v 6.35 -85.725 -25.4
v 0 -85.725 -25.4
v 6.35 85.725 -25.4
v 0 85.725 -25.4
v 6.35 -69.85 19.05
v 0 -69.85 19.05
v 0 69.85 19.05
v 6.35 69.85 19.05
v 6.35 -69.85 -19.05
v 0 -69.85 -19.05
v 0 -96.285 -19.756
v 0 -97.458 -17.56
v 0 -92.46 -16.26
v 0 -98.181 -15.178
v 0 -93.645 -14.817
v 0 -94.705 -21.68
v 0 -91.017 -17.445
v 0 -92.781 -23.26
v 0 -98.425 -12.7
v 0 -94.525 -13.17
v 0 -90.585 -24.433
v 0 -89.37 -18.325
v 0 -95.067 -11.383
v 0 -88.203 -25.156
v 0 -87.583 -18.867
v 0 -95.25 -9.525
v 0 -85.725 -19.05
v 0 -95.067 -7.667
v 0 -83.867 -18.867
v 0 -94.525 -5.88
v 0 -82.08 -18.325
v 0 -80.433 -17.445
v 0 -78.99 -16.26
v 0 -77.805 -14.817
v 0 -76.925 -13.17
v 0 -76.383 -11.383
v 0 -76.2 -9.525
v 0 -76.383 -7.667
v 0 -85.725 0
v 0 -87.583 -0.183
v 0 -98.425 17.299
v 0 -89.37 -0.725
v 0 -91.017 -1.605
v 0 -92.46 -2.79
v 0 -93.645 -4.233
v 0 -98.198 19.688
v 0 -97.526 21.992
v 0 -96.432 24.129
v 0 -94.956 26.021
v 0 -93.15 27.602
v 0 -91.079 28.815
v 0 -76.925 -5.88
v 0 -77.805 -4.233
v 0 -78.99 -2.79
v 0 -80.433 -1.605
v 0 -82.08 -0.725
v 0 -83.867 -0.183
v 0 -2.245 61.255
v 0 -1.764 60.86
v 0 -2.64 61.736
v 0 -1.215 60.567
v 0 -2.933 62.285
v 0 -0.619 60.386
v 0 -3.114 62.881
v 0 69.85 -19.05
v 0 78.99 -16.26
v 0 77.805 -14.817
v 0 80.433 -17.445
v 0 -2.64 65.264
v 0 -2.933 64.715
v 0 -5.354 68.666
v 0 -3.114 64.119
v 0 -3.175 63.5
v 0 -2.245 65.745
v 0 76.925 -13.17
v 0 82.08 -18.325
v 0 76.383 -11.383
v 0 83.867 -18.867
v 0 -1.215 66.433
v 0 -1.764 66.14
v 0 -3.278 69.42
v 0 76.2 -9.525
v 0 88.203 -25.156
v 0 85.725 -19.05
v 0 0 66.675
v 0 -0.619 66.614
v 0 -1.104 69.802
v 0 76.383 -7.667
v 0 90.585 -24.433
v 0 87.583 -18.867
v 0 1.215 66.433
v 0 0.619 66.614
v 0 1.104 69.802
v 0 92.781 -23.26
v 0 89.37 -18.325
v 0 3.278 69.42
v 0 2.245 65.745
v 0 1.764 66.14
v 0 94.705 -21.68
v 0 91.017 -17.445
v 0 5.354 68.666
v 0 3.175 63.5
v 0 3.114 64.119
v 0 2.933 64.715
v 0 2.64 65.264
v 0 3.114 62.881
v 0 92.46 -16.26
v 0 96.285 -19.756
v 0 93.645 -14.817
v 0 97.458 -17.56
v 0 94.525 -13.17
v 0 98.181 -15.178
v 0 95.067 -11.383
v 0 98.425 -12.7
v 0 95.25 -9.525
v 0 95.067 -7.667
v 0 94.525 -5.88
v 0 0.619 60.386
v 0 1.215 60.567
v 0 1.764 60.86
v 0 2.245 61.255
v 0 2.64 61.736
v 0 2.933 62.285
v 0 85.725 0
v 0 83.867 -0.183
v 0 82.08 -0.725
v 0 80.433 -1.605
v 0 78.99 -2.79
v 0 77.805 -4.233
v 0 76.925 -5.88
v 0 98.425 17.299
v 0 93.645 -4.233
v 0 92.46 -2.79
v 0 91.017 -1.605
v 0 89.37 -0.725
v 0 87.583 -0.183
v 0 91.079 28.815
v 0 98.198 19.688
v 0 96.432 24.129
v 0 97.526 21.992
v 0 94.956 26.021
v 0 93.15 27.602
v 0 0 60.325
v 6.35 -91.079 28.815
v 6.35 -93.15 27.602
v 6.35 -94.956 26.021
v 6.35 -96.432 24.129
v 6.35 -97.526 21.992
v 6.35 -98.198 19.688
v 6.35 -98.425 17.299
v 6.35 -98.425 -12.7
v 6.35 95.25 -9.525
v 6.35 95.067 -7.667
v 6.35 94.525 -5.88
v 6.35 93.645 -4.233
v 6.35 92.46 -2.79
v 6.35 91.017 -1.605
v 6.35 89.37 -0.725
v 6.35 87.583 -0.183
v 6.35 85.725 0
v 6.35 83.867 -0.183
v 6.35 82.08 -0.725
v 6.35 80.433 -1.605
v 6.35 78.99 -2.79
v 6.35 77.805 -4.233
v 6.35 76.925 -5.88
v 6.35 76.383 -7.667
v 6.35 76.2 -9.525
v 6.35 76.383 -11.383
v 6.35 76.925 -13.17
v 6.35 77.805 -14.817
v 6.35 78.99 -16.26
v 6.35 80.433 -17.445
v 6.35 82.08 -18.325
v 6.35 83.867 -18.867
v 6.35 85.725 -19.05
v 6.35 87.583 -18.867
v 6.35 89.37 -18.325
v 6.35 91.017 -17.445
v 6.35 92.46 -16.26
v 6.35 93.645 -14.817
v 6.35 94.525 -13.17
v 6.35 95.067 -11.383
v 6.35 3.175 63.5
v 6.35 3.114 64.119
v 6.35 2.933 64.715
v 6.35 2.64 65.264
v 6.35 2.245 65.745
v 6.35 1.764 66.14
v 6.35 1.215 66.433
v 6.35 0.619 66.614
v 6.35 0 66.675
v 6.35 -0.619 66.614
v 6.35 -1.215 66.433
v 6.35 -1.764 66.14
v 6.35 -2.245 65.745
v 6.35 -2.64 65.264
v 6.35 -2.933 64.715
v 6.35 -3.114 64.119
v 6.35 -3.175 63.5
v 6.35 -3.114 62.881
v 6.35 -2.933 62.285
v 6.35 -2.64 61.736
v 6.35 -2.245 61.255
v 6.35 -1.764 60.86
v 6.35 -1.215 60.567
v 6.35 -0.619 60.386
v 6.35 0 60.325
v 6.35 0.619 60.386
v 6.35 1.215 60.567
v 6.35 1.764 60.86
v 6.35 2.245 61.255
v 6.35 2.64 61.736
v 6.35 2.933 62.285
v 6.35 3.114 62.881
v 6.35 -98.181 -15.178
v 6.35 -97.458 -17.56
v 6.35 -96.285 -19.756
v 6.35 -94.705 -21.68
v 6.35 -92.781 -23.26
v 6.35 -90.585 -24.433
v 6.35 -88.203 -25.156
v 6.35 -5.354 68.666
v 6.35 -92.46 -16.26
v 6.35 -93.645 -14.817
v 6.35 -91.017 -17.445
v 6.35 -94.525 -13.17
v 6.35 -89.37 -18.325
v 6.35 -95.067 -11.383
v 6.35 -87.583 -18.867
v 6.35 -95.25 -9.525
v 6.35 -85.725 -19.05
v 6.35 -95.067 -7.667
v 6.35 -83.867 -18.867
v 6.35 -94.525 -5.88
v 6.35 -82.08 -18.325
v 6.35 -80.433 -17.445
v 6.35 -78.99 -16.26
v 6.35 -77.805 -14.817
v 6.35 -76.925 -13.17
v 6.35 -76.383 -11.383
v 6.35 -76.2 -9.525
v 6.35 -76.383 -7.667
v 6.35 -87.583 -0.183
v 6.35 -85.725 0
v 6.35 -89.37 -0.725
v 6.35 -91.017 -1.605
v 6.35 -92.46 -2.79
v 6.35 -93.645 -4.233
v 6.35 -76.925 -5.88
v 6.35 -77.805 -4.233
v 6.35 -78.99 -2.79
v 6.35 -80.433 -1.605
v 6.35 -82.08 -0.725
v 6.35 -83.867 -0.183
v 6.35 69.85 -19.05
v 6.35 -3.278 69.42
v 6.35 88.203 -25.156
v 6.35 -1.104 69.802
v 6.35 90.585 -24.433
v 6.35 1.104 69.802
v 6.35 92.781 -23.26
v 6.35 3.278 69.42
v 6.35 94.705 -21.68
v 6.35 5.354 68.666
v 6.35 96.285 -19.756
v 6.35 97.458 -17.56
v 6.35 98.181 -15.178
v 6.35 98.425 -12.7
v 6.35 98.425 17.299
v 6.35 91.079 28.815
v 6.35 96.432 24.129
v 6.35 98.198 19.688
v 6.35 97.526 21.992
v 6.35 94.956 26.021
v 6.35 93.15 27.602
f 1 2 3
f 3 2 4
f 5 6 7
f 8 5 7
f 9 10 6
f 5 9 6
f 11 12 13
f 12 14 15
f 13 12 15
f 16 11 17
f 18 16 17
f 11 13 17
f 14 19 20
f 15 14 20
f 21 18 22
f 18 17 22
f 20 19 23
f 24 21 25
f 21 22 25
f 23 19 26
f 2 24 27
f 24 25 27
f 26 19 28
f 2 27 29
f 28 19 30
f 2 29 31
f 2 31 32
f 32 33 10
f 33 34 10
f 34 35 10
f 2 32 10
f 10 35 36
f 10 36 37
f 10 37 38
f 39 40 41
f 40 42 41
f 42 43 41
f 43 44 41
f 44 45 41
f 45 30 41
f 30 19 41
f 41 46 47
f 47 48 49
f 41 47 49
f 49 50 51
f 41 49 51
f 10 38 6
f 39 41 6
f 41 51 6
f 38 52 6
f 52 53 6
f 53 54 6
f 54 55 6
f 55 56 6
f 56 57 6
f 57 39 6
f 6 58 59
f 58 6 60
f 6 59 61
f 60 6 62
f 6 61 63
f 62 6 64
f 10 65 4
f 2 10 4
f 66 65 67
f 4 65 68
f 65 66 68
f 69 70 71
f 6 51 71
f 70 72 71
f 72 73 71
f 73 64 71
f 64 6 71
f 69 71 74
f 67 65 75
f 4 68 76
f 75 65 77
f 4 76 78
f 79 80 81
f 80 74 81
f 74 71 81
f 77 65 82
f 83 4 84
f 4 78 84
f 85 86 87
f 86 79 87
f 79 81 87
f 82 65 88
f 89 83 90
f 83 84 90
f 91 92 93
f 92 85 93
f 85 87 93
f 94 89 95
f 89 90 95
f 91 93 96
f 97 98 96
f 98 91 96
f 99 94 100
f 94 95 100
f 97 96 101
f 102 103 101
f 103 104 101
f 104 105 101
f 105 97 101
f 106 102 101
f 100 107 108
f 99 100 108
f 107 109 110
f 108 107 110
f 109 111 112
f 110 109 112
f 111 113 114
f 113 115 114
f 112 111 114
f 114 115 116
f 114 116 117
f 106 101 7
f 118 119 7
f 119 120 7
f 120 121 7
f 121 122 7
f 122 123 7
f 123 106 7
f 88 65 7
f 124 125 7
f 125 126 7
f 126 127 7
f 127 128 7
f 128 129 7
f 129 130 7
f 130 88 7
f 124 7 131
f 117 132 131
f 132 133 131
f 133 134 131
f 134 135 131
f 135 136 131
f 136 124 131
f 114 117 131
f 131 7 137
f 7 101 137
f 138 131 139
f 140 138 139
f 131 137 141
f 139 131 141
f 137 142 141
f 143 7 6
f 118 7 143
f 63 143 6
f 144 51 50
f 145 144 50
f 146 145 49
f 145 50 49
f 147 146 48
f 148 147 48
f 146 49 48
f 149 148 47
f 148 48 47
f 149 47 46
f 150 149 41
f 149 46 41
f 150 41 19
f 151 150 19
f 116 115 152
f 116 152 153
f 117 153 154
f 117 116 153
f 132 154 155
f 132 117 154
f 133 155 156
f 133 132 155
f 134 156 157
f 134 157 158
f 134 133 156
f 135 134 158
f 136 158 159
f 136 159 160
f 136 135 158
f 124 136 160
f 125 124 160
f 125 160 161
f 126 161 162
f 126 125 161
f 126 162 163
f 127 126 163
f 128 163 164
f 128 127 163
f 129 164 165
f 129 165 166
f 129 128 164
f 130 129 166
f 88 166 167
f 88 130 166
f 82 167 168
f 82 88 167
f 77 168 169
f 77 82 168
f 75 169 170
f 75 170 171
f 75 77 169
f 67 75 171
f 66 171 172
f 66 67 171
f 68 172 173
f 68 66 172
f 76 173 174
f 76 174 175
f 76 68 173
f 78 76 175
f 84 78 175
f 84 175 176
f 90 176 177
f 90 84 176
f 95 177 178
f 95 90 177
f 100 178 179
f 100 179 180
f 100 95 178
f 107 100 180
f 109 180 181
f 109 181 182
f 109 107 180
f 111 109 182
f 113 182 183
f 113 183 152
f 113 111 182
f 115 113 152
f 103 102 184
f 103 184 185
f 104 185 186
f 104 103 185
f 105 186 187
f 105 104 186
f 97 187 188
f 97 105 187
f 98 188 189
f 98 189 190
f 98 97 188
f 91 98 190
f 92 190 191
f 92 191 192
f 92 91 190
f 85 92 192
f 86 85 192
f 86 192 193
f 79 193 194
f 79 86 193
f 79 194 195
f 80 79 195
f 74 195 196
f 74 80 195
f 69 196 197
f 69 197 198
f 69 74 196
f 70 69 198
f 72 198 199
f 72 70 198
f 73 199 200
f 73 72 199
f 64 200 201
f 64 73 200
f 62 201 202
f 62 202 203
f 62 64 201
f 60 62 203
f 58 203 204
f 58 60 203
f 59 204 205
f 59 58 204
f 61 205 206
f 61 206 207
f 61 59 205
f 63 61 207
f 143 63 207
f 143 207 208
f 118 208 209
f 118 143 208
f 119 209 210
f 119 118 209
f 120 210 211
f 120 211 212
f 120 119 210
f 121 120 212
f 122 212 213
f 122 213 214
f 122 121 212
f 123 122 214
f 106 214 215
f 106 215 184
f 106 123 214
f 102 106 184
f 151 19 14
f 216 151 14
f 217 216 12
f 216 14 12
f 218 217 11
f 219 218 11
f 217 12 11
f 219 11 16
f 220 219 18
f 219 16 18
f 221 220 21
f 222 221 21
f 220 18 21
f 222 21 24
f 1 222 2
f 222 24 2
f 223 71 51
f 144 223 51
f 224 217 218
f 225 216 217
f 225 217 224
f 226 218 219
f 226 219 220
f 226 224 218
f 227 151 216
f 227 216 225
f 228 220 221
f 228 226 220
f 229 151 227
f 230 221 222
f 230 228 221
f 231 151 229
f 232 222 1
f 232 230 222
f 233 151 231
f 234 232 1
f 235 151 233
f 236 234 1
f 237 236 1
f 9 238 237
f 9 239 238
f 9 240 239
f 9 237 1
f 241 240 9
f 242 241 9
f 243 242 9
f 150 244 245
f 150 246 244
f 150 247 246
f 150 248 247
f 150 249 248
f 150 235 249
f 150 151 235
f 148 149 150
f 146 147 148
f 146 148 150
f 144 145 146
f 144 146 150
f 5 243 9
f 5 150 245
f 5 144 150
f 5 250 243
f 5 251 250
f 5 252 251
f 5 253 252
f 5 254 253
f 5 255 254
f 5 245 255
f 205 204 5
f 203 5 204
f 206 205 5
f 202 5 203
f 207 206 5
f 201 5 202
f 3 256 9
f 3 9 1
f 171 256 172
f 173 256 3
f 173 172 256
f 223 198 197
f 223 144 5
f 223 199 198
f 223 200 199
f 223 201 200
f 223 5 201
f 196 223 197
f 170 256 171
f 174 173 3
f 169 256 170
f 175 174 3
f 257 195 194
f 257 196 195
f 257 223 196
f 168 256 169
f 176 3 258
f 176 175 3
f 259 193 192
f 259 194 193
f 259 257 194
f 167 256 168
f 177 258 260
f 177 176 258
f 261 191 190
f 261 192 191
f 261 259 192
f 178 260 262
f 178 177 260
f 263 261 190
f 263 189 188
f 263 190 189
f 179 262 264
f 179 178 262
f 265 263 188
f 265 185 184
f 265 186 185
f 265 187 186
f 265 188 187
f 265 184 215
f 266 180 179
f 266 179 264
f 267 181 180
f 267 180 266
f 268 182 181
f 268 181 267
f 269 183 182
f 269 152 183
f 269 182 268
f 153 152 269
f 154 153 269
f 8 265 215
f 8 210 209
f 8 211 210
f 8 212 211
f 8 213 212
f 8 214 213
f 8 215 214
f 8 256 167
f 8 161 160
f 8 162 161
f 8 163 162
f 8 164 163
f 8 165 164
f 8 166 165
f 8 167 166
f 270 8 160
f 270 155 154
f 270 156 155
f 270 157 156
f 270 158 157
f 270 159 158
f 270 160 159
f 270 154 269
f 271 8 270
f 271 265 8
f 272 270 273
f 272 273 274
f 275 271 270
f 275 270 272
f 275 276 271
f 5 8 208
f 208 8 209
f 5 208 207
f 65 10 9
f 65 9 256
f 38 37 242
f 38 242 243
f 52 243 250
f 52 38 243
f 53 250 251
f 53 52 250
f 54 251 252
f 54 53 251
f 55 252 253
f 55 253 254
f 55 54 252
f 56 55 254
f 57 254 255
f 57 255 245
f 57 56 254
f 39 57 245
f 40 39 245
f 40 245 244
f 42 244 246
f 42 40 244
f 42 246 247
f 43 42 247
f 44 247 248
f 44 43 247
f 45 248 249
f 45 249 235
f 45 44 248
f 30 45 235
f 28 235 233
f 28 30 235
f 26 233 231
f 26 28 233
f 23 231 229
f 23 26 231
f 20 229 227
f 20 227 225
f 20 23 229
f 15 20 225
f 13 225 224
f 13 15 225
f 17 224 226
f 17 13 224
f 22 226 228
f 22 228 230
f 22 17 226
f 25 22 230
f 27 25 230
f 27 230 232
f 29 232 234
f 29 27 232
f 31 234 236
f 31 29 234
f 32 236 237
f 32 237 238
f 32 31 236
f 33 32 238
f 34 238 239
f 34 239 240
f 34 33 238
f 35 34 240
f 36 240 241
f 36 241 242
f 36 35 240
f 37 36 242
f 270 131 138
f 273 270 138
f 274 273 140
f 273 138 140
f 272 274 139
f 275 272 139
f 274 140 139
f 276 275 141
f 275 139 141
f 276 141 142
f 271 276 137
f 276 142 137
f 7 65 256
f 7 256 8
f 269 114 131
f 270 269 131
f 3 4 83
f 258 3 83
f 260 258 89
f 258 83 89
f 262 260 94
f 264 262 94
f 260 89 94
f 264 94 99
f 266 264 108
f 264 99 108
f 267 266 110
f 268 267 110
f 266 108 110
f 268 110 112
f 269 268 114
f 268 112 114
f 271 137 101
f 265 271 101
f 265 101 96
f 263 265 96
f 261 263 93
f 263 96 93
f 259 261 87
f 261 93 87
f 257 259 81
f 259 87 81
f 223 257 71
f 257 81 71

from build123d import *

# Parameters (mm, degrees)
F0_R     = 9.525
F0_W     = 139.7
F0_H     = 38.1
F0_R_2   = 3.175
F1_DEPTH = 6.35


with BuildPart() as f1:
    # F0 (on Right) → F1 (new body)
    with BuildSketch(Plane.YZ):
        with BuildLine():
            Line((-85.725, -25.4), (85.725, -25.4))
            ThreePointArc((85.725, -25.4), (94.705256, -21.680256), (98.425, -12.7))
            Line((98.425, -12.7), (98.425, 17.298685))
            ThreePointArc((98.425, 17.298685), (96.432049, 24.128699), (91.078686, 28.81511))
            Line((91.078686, 28.81511), (5.353686, 68.666425))
            ThreePointArc((5.353686, 68.666425), (0, 69.85), (-5.353686, 68.666425))
            Line((-5.353686, 68.666425), (-91.078686, 28.81511))
            ThreePointArc((-91.078686, 28.81511), (-96.432049, 24.128699), (-98.425, 17.298685))
            Line((-98.425, 17.298685), (-98.425, -12.7))
            ThreePointArc((-98.425, -12.7), (-94.705256, -21.680256), (-85.725, -25.4))
        make_face()
        with Locations((-85.725, -9.525)):
            Circle(F0_R, mode=Mode.SUBTRACT)
        with Locations((85.725, -9.525)):
            Circle(F0_R, mode=Mode.SUBTRACT)
        Rectangle(F0_W, F0_H, mode=Mode.SUBTRACT)
        with Locations((0, 63.5)):
            Circle(F0_R_2, mode=Mode.SUBTRACT)
    extrude(amount=F1_DEPTH)


solid = f1.part
